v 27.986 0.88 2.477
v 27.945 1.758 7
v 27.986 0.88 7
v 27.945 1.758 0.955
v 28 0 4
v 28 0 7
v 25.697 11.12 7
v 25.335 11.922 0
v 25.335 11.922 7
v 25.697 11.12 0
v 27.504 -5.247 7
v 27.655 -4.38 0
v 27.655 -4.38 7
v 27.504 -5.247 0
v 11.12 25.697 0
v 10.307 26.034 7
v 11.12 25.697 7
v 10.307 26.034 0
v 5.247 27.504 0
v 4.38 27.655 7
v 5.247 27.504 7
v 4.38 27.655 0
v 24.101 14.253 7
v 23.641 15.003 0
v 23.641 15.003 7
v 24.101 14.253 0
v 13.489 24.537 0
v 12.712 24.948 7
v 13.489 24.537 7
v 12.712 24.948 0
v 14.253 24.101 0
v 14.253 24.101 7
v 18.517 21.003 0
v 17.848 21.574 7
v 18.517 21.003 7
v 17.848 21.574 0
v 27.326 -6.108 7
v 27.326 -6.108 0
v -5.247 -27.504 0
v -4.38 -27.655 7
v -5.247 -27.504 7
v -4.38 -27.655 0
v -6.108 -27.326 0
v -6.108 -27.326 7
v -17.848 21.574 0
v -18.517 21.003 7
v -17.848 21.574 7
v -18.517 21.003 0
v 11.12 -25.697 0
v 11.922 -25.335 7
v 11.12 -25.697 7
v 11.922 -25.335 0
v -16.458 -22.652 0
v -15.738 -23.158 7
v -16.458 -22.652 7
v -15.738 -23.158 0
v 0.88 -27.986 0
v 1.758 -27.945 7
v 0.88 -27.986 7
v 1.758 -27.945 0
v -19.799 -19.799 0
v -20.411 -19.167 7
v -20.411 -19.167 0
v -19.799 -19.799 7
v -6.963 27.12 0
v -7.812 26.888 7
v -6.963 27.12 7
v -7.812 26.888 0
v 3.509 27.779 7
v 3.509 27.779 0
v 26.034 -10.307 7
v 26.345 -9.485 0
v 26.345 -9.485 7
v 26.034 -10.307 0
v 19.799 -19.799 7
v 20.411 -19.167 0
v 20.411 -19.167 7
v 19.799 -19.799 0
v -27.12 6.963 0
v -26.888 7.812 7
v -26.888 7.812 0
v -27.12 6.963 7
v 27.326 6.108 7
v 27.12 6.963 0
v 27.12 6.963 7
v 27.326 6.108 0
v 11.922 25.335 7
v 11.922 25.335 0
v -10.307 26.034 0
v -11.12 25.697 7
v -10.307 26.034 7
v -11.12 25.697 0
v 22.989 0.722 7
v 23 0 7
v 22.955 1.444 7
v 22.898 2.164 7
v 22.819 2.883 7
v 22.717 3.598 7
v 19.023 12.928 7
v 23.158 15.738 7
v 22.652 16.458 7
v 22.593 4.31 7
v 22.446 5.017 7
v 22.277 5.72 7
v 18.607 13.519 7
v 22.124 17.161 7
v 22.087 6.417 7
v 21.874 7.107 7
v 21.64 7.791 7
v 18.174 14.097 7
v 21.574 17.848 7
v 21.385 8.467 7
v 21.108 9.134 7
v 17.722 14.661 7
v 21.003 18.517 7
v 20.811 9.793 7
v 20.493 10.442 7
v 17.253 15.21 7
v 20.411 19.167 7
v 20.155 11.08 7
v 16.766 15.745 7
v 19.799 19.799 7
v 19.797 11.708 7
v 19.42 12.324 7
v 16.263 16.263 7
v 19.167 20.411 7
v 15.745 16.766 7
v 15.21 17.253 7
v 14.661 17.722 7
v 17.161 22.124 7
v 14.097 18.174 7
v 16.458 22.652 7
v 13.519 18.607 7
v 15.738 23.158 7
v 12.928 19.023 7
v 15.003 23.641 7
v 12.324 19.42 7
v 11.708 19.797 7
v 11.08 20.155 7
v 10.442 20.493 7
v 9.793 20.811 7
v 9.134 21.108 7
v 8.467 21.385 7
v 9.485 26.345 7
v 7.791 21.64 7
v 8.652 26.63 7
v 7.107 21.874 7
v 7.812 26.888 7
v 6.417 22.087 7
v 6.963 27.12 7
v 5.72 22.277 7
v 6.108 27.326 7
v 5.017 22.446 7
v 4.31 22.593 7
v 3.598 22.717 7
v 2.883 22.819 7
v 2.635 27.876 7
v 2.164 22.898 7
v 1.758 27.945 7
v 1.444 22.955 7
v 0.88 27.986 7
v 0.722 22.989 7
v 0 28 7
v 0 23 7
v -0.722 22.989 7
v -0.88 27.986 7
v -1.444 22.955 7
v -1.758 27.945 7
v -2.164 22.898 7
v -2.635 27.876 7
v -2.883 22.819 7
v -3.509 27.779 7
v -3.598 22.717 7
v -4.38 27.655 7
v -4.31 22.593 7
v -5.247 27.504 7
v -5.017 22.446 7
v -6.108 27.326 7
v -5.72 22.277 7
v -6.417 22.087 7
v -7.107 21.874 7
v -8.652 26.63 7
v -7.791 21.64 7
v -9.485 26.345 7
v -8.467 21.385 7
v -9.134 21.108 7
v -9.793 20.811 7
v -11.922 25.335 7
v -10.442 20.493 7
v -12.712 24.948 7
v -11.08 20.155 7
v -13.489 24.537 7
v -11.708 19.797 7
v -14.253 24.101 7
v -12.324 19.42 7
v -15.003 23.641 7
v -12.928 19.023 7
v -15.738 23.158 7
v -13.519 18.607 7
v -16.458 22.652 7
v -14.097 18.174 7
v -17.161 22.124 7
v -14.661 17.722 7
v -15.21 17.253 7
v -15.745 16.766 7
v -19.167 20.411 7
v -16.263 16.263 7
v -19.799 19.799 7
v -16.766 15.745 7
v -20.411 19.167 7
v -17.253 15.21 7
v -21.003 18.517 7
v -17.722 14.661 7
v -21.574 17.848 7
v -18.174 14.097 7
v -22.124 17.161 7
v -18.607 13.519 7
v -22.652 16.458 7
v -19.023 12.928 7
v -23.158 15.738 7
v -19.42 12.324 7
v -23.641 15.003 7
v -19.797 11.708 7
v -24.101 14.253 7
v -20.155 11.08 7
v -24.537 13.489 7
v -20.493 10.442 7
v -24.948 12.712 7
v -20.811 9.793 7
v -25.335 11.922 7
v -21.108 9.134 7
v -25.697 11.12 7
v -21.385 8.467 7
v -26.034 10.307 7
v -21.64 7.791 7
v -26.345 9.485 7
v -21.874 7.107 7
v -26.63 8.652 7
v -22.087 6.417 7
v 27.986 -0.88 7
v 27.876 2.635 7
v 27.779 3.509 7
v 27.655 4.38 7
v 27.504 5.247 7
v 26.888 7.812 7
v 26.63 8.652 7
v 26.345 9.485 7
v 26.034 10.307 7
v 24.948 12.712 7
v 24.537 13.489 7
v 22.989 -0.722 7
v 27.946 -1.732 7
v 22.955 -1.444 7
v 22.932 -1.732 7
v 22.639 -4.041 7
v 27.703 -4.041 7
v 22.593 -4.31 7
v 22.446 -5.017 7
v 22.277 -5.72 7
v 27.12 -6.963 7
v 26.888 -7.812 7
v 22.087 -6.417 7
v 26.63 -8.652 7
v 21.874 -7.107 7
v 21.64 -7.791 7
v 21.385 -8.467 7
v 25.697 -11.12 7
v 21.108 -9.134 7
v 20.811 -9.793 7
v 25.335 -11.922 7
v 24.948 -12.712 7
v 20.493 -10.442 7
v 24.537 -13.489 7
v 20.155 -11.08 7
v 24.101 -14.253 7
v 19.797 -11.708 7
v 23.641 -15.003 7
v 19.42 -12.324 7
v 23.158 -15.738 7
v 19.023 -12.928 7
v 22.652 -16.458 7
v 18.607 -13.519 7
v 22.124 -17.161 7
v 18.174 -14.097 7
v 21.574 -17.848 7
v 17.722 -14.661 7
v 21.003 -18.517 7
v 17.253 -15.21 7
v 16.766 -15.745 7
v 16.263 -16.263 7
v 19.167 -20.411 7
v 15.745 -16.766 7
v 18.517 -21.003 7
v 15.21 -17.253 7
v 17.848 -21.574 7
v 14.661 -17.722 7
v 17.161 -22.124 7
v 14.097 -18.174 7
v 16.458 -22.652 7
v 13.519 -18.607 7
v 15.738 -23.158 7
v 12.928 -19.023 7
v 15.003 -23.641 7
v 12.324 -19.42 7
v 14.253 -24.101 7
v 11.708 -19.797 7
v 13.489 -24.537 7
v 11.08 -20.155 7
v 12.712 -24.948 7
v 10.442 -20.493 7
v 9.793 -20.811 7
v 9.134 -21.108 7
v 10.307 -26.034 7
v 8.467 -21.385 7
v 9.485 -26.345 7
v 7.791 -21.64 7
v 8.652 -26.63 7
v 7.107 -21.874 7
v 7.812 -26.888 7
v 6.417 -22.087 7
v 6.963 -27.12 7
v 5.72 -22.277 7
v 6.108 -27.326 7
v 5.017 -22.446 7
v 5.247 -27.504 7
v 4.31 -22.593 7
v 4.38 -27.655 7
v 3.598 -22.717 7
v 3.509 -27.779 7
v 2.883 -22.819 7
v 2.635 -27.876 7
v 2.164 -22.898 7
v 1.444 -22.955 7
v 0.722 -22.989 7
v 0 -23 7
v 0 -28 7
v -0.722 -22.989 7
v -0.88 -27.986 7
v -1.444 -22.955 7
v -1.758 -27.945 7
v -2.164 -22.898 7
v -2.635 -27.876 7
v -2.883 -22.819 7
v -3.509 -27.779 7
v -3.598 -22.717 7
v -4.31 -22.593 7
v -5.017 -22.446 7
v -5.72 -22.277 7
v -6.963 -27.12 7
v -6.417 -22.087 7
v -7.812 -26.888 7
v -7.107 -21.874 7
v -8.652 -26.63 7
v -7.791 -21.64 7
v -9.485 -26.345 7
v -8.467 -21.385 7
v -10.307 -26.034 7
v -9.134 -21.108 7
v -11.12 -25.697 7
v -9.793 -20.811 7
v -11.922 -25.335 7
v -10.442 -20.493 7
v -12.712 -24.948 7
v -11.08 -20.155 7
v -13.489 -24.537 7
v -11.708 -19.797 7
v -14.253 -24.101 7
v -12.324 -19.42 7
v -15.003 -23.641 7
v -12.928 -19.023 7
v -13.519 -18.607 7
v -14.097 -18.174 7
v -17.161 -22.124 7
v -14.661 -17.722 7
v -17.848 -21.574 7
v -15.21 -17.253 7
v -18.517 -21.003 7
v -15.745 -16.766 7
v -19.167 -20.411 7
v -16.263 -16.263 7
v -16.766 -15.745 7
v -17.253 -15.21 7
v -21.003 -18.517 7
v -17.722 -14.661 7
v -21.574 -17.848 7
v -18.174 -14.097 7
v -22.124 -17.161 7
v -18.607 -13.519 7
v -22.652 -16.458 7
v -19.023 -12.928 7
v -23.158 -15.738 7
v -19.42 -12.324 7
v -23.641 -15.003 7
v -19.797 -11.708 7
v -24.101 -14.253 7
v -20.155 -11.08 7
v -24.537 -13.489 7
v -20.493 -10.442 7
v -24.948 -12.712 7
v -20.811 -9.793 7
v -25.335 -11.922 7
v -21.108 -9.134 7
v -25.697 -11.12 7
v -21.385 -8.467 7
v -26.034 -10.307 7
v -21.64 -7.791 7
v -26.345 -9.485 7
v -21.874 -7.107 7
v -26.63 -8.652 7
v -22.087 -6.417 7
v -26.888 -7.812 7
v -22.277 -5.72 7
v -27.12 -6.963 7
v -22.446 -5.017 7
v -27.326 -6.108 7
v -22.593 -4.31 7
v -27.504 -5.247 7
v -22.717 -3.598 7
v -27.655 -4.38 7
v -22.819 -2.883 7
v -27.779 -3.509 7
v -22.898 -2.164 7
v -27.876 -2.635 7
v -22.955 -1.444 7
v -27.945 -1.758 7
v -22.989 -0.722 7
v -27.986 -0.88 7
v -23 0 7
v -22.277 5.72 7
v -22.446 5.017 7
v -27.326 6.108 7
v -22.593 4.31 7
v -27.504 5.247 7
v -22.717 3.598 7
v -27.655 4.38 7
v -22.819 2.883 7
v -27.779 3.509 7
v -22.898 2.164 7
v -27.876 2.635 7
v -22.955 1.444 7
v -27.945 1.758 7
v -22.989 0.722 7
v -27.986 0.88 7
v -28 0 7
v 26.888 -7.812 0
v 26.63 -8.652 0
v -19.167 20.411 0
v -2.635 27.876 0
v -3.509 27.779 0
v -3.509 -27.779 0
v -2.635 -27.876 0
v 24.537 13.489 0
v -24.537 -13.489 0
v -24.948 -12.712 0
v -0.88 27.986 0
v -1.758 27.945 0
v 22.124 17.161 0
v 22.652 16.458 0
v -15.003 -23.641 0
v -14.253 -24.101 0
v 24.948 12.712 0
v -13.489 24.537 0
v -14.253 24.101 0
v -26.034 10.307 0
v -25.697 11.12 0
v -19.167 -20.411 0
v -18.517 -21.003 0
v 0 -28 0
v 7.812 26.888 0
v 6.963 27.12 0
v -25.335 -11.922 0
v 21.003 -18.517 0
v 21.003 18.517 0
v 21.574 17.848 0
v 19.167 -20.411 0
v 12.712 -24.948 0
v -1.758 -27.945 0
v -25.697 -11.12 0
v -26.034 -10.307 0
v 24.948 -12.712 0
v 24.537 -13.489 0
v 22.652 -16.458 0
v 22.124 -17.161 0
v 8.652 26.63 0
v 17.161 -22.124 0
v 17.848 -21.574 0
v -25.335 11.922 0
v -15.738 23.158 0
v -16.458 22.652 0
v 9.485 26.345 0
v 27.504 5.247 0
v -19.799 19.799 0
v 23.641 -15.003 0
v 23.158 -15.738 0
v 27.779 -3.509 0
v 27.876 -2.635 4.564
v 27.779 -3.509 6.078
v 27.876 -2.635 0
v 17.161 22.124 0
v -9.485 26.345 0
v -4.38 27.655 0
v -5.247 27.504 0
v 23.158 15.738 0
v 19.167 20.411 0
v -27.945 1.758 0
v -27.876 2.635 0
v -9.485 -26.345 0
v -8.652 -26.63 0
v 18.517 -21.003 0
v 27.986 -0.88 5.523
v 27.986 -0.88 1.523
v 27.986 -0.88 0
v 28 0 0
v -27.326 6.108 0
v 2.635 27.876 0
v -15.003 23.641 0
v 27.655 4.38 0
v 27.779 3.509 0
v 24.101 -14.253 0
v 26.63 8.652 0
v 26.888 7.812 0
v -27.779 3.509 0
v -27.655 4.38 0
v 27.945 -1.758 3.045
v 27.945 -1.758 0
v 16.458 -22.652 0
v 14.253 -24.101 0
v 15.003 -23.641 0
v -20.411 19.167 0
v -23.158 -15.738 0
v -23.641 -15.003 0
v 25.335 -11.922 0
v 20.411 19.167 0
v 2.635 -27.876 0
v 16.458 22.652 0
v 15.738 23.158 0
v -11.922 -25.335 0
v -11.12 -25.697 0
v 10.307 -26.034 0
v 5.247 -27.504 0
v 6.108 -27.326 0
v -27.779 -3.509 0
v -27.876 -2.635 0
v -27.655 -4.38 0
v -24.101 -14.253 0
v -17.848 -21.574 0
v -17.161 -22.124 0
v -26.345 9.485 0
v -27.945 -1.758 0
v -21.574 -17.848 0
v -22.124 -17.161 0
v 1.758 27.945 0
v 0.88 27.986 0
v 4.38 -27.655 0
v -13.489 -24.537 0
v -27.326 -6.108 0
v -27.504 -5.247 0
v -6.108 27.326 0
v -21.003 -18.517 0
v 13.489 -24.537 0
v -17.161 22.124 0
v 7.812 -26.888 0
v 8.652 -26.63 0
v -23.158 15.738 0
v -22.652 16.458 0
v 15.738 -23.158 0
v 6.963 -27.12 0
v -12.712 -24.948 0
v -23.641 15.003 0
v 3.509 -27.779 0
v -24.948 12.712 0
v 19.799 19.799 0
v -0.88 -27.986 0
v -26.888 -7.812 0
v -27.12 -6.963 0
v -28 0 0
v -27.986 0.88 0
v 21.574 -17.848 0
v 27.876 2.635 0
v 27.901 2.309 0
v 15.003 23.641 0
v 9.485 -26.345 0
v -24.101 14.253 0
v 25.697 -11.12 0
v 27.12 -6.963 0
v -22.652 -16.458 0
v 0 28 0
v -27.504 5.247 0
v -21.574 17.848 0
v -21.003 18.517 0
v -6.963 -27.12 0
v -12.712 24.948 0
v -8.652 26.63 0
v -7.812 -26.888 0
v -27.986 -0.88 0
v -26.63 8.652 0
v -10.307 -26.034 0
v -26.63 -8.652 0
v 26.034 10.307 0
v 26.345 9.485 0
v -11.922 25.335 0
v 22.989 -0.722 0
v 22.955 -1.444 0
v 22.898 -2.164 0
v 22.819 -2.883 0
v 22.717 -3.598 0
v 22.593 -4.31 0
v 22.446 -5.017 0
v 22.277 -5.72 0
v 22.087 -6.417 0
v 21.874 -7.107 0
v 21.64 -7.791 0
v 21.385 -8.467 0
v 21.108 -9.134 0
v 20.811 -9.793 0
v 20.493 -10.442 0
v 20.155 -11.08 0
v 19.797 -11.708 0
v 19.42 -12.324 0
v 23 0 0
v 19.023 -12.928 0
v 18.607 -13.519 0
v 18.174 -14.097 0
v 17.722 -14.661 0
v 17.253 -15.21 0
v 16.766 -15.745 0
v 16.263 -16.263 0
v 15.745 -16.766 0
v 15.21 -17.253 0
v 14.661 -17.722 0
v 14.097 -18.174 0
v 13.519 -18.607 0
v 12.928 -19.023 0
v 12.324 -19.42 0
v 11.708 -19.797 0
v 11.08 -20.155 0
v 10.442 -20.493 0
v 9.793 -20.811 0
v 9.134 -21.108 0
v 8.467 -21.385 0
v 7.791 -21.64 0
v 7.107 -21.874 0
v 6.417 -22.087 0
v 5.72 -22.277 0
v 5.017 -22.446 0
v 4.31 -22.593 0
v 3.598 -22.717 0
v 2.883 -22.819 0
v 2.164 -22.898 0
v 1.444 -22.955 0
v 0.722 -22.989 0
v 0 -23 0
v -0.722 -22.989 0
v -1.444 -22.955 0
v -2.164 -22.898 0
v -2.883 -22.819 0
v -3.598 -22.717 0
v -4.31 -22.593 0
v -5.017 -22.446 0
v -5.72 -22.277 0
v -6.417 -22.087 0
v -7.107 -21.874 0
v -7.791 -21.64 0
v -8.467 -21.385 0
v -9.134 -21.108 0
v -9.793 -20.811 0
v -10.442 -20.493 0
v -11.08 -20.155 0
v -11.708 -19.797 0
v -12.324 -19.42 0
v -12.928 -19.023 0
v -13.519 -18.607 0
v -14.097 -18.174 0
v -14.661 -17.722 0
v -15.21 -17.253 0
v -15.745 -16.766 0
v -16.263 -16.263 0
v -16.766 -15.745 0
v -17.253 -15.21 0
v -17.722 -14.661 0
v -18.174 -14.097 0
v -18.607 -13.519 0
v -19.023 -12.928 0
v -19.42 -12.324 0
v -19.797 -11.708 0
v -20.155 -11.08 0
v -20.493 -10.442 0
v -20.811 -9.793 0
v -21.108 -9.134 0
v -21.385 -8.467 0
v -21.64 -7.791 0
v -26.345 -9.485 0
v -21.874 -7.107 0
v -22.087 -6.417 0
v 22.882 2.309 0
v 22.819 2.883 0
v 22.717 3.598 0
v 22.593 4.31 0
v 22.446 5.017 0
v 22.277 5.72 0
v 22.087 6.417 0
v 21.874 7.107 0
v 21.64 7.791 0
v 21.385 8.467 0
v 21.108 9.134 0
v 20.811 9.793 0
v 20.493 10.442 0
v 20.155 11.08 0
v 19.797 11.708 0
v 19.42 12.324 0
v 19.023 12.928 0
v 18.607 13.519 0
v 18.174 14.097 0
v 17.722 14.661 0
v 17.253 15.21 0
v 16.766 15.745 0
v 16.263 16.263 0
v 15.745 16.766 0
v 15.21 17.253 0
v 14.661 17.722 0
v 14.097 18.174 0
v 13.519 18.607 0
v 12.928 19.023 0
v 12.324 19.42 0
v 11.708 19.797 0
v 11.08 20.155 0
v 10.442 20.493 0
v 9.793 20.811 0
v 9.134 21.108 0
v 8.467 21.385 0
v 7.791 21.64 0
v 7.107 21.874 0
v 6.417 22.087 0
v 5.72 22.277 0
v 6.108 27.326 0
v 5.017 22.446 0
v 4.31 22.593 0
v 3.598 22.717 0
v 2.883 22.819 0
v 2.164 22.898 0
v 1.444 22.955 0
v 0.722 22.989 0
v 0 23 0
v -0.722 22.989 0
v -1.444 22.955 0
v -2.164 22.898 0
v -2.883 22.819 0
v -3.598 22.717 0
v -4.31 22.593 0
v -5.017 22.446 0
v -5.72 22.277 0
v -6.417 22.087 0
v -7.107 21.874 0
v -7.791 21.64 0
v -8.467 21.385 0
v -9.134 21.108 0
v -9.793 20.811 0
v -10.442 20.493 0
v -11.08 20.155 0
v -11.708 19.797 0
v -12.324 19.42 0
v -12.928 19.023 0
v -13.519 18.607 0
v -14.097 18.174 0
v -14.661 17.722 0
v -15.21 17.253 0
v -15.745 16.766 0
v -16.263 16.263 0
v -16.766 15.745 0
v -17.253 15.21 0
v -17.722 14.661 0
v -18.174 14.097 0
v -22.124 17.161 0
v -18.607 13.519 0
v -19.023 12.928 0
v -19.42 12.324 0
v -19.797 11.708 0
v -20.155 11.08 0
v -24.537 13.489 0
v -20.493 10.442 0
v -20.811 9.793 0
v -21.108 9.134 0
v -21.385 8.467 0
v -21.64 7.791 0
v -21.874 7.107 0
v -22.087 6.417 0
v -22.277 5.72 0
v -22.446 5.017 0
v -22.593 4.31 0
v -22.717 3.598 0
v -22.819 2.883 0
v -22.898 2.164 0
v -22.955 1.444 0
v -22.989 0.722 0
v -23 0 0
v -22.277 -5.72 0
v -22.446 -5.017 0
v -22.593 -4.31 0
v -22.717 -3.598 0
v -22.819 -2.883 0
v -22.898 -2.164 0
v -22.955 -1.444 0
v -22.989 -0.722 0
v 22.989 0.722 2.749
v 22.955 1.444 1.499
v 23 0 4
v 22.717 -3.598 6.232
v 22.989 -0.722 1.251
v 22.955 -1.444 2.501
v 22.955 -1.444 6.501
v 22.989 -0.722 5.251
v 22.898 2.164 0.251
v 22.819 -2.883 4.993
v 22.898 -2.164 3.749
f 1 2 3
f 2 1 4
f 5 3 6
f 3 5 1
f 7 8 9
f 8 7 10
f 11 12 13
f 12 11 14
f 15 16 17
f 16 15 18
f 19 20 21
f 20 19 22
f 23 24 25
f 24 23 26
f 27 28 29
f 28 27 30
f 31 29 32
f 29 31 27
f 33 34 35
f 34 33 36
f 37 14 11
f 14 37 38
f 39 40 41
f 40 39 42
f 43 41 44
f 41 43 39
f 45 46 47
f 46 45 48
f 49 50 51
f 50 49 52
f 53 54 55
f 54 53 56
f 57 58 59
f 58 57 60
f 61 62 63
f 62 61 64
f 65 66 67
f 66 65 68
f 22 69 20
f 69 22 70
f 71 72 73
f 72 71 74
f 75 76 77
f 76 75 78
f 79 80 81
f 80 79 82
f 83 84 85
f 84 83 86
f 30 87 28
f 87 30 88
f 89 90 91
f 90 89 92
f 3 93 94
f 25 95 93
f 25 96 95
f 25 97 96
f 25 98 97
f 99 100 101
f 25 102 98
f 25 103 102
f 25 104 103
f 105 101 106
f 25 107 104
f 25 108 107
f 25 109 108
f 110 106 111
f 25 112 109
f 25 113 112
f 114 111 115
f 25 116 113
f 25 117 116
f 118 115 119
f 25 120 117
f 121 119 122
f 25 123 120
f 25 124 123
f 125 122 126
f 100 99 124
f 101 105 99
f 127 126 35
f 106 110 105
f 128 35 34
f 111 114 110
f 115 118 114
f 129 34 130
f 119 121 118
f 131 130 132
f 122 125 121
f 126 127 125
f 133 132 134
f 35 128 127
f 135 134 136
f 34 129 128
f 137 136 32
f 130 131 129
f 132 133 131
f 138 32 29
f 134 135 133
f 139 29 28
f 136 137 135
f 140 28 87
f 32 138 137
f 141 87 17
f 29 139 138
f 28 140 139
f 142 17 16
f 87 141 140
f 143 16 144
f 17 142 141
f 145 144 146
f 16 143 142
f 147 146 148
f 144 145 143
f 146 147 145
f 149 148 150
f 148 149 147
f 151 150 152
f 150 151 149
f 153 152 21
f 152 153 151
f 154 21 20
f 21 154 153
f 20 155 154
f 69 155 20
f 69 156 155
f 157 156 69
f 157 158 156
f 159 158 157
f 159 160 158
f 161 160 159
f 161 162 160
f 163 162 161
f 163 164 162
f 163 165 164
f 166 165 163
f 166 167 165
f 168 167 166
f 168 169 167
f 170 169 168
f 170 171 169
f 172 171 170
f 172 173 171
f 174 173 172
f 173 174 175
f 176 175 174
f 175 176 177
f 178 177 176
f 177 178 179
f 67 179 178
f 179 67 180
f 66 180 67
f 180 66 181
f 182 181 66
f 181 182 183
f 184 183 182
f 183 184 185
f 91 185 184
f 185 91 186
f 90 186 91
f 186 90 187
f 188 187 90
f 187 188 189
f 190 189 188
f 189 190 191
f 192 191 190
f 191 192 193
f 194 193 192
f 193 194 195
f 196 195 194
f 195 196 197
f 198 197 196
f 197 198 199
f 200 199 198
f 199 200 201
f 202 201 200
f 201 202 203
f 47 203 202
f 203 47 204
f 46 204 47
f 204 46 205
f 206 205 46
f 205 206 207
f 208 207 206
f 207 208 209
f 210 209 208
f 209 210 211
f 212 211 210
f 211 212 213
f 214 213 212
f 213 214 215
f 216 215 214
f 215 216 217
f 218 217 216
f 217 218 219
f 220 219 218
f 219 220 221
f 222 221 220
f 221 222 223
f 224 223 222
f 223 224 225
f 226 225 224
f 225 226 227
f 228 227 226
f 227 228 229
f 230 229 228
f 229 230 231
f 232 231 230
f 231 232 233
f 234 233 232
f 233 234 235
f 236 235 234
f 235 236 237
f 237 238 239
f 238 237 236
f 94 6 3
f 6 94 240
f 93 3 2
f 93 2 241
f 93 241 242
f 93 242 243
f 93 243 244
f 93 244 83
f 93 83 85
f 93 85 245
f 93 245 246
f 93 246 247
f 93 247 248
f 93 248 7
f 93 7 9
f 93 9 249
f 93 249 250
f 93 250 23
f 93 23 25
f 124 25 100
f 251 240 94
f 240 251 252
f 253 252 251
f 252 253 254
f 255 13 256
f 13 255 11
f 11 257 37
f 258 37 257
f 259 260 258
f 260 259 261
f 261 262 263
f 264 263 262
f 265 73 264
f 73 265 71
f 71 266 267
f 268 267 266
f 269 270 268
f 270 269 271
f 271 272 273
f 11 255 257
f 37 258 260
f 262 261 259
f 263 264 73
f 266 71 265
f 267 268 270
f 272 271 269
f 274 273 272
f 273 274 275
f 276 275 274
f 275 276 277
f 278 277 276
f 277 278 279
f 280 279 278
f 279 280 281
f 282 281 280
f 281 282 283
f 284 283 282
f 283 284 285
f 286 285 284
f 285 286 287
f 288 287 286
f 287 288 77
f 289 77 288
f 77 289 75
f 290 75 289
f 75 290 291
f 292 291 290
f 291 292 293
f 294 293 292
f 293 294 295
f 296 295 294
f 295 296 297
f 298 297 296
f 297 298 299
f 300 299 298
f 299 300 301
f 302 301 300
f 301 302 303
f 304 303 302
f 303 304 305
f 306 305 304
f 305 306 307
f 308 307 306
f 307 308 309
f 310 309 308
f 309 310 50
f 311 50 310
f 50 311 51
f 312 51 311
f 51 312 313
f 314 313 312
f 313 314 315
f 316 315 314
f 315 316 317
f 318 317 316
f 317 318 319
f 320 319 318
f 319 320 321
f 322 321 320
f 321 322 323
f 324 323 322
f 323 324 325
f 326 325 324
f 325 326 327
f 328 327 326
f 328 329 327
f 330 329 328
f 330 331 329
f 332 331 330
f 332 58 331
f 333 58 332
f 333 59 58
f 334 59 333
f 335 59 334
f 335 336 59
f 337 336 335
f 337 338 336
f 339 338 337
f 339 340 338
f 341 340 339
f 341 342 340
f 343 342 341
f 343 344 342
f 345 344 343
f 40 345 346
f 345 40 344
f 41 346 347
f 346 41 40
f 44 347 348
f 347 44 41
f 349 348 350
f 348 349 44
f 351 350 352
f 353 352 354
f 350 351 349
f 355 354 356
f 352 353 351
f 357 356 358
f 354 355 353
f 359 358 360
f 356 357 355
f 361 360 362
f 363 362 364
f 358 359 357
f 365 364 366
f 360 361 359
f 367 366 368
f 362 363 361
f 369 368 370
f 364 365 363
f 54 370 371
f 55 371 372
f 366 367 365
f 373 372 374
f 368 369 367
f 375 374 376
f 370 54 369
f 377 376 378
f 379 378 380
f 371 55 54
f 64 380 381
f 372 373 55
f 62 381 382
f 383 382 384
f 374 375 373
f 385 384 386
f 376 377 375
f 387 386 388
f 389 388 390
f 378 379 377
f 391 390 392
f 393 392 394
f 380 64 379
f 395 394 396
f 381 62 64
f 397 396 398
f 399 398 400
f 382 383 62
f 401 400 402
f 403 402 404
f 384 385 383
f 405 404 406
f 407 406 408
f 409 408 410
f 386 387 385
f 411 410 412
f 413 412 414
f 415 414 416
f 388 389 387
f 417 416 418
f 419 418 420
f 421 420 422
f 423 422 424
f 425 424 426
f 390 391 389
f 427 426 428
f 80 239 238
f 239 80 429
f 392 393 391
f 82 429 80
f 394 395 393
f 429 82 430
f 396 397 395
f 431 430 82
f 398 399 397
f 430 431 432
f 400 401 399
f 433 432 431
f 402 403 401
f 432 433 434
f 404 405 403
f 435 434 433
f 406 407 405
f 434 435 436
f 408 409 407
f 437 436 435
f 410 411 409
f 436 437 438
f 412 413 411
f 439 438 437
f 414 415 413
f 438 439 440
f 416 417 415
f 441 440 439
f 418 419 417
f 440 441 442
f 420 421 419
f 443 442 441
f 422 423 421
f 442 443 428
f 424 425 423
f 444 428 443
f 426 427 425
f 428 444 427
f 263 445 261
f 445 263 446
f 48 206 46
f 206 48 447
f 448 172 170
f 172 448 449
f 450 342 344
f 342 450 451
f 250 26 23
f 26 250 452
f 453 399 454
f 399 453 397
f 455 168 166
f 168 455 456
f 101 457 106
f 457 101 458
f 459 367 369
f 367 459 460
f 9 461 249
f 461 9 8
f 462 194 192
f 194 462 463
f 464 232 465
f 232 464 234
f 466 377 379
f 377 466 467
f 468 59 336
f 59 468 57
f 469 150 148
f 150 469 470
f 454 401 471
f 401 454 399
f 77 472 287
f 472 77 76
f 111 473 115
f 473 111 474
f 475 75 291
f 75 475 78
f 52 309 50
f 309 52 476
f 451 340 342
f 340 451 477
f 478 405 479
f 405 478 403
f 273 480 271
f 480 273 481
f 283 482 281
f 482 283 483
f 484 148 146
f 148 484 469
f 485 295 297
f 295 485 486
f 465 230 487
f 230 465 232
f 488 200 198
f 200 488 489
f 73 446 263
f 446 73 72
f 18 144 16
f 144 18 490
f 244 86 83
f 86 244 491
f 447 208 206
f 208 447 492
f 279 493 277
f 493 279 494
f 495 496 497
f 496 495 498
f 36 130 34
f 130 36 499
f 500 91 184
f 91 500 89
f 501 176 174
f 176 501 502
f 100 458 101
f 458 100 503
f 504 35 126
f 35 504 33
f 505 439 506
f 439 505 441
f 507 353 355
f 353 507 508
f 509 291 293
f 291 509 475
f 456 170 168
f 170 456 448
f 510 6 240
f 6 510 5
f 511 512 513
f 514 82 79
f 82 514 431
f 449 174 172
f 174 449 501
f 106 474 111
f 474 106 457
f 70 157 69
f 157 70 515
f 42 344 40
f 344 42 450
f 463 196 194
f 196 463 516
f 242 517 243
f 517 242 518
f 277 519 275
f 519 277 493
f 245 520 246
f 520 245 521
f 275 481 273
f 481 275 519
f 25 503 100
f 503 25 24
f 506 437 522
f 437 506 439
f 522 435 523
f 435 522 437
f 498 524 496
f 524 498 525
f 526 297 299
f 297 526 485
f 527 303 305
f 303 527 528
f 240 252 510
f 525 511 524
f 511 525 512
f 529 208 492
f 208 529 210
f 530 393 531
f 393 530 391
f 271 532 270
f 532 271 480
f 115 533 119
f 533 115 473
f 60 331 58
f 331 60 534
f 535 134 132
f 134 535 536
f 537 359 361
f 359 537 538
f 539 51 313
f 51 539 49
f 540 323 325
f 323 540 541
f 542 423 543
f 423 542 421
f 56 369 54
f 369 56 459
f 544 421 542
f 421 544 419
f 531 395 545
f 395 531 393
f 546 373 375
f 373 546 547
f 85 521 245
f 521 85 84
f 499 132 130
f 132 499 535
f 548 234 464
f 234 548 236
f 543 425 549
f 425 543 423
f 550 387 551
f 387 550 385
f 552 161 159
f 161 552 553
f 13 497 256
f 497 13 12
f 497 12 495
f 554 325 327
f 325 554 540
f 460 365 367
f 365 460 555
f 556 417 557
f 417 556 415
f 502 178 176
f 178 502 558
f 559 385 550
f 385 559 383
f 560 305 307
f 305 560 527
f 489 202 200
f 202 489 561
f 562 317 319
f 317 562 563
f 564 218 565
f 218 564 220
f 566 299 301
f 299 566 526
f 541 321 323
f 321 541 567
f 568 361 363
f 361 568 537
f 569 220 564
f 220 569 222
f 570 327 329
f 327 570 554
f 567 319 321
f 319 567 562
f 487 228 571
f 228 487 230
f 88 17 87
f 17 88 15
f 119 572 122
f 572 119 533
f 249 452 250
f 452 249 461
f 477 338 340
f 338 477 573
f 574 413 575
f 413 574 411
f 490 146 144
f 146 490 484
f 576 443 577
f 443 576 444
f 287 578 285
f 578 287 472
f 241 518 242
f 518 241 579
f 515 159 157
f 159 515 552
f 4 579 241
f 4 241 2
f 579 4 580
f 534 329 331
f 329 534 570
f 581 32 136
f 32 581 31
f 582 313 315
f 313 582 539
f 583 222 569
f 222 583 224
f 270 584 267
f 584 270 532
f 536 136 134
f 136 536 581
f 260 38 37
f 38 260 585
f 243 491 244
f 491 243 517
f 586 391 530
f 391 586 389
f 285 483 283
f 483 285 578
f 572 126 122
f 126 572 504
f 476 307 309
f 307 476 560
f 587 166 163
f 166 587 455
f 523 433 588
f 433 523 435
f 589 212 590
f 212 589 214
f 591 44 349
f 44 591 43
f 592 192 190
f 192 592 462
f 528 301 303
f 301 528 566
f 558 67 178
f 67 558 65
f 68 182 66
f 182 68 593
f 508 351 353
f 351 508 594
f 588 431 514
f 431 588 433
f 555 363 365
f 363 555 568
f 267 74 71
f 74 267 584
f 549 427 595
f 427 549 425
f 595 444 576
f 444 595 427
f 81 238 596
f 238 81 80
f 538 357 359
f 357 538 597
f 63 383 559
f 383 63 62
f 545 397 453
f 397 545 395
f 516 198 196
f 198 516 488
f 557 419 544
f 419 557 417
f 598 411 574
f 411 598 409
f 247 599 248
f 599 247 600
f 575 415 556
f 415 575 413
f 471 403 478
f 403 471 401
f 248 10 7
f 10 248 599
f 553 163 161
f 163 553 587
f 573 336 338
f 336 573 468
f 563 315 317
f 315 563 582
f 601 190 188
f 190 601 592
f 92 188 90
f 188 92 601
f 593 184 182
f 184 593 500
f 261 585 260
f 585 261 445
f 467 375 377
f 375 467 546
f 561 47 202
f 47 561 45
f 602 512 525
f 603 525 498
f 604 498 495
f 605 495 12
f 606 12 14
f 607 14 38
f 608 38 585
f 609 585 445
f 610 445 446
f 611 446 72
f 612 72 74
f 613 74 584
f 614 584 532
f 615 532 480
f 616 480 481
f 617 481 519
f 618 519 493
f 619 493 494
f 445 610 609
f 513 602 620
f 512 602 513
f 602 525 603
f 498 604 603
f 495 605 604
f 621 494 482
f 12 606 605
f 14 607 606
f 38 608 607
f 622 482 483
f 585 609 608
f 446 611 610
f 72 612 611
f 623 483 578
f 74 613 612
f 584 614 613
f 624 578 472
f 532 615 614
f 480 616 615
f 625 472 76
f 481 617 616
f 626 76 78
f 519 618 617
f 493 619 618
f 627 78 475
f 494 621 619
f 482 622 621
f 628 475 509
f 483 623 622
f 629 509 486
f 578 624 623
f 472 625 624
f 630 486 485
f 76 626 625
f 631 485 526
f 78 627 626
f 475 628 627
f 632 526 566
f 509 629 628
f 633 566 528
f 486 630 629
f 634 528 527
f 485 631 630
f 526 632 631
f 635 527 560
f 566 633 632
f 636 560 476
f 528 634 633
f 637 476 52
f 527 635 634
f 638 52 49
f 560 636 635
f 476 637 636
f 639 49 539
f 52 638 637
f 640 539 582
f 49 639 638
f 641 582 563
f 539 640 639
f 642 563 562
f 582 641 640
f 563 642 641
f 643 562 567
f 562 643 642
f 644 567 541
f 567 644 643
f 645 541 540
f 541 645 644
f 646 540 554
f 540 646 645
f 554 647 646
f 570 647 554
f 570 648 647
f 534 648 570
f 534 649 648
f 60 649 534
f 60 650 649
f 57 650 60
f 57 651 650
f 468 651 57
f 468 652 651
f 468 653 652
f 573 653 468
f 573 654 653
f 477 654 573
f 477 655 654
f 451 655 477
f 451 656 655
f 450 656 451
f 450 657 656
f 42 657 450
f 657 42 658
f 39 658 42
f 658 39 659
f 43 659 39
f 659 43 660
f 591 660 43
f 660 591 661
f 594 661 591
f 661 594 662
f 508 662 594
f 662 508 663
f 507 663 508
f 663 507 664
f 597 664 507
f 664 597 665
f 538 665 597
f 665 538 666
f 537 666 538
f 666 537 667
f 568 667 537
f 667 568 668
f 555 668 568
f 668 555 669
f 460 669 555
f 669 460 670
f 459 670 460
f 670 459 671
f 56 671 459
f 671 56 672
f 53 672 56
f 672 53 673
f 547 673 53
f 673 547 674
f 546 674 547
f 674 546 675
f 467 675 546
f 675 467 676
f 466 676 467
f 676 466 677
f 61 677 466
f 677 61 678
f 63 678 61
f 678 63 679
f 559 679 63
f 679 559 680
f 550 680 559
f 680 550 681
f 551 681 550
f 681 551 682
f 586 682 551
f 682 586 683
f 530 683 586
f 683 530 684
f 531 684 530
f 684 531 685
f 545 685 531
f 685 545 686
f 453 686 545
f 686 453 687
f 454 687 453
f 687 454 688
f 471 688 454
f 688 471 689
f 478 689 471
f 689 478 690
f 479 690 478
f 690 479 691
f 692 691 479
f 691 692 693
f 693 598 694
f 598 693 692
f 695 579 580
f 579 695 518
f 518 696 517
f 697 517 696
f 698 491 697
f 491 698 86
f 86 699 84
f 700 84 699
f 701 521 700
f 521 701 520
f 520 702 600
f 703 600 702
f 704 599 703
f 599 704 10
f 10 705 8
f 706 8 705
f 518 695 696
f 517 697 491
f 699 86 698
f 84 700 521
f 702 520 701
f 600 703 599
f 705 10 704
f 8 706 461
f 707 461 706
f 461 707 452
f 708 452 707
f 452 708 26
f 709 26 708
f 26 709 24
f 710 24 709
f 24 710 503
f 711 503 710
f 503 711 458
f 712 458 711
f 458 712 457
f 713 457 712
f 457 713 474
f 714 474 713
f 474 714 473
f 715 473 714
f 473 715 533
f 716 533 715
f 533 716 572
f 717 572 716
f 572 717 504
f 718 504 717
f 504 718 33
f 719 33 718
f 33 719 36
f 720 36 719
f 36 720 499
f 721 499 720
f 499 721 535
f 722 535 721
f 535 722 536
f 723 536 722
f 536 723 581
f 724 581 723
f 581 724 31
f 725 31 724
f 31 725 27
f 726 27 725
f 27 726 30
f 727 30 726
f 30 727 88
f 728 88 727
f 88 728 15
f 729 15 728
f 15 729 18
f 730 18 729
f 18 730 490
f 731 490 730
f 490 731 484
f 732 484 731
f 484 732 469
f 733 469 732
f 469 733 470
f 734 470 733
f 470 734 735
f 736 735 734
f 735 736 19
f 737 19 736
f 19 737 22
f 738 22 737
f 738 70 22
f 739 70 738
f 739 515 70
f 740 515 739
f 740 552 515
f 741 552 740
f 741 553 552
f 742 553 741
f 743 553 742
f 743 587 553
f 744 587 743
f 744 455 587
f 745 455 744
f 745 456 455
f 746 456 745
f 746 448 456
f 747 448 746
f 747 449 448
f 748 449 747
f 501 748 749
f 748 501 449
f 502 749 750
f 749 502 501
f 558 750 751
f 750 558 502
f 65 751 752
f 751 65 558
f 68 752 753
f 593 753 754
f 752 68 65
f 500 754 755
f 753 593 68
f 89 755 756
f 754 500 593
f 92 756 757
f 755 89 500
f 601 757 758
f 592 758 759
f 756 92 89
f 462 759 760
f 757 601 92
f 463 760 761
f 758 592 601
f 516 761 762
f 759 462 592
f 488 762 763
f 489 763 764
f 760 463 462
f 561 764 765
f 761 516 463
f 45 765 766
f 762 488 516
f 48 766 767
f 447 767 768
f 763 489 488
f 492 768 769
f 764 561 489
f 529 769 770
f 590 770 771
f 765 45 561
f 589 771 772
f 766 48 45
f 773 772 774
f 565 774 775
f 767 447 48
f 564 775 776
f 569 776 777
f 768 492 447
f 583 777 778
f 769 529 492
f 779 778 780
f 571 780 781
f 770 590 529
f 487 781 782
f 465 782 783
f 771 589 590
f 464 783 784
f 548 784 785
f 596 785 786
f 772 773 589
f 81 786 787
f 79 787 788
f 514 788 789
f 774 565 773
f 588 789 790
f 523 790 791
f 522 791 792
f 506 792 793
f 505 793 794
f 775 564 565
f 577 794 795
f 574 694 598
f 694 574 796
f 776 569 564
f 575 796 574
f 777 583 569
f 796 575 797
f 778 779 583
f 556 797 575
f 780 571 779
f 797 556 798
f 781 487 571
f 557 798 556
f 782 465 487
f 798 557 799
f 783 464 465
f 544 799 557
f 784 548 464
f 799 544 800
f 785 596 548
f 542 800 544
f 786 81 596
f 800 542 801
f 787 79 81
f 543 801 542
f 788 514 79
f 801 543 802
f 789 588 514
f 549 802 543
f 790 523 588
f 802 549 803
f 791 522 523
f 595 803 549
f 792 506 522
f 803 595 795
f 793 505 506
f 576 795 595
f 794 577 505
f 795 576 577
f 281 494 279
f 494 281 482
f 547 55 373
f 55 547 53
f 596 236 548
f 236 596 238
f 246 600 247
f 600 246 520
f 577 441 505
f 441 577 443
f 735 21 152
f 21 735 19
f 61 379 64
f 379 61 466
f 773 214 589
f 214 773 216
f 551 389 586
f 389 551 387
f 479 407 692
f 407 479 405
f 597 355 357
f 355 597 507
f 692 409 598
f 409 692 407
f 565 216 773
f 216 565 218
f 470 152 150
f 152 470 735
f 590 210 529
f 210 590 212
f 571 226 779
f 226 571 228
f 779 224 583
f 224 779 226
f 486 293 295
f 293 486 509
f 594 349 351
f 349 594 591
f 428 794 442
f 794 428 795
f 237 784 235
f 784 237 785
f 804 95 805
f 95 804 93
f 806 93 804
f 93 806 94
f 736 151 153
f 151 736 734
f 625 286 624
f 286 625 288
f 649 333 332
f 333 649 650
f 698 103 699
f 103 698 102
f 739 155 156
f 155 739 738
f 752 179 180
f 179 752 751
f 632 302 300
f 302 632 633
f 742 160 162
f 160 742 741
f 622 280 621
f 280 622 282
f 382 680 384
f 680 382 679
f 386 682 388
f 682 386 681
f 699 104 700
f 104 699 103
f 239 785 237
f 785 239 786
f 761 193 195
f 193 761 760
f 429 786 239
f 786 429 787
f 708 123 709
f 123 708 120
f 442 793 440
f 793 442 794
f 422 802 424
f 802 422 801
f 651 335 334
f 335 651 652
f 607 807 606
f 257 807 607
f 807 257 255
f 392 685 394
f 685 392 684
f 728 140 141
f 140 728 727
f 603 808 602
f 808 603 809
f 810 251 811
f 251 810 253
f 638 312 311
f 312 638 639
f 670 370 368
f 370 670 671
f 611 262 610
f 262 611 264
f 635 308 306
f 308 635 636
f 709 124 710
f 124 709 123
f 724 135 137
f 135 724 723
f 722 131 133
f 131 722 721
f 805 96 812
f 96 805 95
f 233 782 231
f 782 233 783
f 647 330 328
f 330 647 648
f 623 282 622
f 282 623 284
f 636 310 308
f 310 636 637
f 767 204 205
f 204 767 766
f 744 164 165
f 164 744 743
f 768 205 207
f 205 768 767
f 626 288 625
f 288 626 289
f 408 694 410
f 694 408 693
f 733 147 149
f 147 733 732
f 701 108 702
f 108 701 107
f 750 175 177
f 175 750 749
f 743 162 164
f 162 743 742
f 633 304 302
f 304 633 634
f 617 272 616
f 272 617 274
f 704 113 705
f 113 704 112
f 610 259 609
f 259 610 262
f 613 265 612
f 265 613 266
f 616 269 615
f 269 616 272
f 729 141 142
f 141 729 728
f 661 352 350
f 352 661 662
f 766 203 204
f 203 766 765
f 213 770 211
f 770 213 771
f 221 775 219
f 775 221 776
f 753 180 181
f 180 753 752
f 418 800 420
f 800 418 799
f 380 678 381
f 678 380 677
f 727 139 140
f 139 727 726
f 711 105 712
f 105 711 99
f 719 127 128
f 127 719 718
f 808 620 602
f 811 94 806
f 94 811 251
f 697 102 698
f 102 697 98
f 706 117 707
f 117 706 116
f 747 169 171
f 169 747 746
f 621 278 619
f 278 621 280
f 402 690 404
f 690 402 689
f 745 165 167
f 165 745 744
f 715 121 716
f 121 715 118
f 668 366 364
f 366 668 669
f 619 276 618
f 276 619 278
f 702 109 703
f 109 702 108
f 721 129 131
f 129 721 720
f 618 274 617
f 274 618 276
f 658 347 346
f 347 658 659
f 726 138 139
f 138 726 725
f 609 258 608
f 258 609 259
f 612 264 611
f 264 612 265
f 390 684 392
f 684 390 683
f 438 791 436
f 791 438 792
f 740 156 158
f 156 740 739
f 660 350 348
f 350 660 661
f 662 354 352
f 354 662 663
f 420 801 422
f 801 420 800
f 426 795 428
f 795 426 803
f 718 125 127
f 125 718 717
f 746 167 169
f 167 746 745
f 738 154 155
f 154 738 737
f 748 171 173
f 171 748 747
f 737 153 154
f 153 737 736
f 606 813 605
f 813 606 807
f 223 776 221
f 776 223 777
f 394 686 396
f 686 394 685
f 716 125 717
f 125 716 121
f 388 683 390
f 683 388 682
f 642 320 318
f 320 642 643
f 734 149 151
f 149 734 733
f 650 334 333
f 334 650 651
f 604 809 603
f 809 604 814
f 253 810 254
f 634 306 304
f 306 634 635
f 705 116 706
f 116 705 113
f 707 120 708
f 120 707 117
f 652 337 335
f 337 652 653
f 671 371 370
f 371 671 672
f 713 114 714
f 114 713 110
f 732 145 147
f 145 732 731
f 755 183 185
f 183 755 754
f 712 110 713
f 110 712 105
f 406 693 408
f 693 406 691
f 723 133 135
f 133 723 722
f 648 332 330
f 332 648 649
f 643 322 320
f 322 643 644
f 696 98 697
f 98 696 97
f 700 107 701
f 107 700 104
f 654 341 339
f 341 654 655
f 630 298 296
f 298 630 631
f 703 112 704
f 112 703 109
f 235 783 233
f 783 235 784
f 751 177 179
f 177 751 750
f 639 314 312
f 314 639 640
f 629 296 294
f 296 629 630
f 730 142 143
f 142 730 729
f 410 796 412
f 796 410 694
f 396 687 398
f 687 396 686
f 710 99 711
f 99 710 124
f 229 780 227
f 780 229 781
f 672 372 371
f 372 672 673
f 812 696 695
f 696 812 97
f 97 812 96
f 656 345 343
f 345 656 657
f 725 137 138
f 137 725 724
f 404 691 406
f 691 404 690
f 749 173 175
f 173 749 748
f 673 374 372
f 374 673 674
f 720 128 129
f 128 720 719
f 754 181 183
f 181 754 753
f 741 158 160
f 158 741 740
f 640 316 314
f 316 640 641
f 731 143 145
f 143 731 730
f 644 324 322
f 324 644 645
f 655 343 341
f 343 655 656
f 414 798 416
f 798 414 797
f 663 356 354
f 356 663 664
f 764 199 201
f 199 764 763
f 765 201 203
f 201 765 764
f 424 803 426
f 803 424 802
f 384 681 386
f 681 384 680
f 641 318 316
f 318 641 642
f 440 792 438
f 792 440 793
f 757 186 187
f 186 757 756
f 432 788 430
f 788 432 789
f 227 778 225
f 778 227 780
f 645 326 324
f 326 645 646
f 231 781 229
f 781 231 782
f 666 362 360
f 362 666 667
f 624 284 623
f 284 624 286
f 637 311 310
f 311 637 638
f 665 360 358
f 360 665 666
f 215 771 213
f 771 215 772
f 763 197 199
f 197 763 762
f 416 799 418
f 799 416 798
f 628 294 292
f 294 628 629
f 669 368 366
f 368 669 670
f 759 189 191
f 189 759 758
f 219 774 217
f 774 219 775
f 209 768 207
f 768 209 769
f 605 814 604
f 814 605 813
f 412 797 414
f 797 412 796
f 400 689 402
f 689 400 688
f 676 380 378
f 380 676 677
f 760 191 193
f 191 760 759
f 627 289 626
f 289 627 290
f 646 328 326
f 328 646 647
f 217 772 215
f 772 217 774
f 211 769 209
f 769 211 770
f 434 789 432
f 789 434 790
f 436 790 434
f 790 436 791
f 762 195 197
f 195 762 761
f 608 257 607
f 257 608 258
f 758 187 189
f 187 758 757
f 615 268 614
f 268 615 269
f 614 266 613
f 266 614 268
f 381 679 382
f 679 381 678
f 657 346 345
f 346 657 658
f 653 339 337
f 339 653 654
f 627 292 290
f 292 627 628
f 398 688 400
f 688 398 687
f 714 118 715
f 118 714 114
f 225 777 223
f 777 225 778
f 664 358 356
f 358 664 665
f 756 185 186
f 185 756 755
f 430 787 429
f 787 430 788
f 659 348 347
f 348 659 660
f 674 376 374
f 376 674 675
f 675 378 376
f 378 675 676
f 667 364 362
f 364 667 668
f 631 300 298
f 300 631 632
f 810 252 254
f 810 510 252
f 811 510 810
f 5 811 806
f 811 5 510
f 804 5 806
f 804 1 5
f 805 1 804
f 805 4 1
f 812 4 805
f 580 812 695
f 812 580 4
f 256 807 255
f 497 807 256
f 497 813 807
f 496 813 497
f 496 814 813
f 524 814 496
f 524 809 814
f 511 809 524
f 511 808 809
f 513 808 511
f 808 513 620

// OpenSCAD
// Rolling Pin Spacers
// all measurements are in mm

// Diameter of rolling pin in mm (best if slightly smaller than actual)
pin = 46;
pinr=pin/2;

// How thick you want the dough to be in mm
Dough = 5;

difference () {
   cylinder (h=7,r=pinr+Dough, $fn = 200);
   translate ([0,0,-2]) cylinder (h=14,r=pinr, $fn = 200);
   rotate([30,0,0]) translate ([0,0,-5]) cube([pinr+Dough+2,2,20]);;
}
